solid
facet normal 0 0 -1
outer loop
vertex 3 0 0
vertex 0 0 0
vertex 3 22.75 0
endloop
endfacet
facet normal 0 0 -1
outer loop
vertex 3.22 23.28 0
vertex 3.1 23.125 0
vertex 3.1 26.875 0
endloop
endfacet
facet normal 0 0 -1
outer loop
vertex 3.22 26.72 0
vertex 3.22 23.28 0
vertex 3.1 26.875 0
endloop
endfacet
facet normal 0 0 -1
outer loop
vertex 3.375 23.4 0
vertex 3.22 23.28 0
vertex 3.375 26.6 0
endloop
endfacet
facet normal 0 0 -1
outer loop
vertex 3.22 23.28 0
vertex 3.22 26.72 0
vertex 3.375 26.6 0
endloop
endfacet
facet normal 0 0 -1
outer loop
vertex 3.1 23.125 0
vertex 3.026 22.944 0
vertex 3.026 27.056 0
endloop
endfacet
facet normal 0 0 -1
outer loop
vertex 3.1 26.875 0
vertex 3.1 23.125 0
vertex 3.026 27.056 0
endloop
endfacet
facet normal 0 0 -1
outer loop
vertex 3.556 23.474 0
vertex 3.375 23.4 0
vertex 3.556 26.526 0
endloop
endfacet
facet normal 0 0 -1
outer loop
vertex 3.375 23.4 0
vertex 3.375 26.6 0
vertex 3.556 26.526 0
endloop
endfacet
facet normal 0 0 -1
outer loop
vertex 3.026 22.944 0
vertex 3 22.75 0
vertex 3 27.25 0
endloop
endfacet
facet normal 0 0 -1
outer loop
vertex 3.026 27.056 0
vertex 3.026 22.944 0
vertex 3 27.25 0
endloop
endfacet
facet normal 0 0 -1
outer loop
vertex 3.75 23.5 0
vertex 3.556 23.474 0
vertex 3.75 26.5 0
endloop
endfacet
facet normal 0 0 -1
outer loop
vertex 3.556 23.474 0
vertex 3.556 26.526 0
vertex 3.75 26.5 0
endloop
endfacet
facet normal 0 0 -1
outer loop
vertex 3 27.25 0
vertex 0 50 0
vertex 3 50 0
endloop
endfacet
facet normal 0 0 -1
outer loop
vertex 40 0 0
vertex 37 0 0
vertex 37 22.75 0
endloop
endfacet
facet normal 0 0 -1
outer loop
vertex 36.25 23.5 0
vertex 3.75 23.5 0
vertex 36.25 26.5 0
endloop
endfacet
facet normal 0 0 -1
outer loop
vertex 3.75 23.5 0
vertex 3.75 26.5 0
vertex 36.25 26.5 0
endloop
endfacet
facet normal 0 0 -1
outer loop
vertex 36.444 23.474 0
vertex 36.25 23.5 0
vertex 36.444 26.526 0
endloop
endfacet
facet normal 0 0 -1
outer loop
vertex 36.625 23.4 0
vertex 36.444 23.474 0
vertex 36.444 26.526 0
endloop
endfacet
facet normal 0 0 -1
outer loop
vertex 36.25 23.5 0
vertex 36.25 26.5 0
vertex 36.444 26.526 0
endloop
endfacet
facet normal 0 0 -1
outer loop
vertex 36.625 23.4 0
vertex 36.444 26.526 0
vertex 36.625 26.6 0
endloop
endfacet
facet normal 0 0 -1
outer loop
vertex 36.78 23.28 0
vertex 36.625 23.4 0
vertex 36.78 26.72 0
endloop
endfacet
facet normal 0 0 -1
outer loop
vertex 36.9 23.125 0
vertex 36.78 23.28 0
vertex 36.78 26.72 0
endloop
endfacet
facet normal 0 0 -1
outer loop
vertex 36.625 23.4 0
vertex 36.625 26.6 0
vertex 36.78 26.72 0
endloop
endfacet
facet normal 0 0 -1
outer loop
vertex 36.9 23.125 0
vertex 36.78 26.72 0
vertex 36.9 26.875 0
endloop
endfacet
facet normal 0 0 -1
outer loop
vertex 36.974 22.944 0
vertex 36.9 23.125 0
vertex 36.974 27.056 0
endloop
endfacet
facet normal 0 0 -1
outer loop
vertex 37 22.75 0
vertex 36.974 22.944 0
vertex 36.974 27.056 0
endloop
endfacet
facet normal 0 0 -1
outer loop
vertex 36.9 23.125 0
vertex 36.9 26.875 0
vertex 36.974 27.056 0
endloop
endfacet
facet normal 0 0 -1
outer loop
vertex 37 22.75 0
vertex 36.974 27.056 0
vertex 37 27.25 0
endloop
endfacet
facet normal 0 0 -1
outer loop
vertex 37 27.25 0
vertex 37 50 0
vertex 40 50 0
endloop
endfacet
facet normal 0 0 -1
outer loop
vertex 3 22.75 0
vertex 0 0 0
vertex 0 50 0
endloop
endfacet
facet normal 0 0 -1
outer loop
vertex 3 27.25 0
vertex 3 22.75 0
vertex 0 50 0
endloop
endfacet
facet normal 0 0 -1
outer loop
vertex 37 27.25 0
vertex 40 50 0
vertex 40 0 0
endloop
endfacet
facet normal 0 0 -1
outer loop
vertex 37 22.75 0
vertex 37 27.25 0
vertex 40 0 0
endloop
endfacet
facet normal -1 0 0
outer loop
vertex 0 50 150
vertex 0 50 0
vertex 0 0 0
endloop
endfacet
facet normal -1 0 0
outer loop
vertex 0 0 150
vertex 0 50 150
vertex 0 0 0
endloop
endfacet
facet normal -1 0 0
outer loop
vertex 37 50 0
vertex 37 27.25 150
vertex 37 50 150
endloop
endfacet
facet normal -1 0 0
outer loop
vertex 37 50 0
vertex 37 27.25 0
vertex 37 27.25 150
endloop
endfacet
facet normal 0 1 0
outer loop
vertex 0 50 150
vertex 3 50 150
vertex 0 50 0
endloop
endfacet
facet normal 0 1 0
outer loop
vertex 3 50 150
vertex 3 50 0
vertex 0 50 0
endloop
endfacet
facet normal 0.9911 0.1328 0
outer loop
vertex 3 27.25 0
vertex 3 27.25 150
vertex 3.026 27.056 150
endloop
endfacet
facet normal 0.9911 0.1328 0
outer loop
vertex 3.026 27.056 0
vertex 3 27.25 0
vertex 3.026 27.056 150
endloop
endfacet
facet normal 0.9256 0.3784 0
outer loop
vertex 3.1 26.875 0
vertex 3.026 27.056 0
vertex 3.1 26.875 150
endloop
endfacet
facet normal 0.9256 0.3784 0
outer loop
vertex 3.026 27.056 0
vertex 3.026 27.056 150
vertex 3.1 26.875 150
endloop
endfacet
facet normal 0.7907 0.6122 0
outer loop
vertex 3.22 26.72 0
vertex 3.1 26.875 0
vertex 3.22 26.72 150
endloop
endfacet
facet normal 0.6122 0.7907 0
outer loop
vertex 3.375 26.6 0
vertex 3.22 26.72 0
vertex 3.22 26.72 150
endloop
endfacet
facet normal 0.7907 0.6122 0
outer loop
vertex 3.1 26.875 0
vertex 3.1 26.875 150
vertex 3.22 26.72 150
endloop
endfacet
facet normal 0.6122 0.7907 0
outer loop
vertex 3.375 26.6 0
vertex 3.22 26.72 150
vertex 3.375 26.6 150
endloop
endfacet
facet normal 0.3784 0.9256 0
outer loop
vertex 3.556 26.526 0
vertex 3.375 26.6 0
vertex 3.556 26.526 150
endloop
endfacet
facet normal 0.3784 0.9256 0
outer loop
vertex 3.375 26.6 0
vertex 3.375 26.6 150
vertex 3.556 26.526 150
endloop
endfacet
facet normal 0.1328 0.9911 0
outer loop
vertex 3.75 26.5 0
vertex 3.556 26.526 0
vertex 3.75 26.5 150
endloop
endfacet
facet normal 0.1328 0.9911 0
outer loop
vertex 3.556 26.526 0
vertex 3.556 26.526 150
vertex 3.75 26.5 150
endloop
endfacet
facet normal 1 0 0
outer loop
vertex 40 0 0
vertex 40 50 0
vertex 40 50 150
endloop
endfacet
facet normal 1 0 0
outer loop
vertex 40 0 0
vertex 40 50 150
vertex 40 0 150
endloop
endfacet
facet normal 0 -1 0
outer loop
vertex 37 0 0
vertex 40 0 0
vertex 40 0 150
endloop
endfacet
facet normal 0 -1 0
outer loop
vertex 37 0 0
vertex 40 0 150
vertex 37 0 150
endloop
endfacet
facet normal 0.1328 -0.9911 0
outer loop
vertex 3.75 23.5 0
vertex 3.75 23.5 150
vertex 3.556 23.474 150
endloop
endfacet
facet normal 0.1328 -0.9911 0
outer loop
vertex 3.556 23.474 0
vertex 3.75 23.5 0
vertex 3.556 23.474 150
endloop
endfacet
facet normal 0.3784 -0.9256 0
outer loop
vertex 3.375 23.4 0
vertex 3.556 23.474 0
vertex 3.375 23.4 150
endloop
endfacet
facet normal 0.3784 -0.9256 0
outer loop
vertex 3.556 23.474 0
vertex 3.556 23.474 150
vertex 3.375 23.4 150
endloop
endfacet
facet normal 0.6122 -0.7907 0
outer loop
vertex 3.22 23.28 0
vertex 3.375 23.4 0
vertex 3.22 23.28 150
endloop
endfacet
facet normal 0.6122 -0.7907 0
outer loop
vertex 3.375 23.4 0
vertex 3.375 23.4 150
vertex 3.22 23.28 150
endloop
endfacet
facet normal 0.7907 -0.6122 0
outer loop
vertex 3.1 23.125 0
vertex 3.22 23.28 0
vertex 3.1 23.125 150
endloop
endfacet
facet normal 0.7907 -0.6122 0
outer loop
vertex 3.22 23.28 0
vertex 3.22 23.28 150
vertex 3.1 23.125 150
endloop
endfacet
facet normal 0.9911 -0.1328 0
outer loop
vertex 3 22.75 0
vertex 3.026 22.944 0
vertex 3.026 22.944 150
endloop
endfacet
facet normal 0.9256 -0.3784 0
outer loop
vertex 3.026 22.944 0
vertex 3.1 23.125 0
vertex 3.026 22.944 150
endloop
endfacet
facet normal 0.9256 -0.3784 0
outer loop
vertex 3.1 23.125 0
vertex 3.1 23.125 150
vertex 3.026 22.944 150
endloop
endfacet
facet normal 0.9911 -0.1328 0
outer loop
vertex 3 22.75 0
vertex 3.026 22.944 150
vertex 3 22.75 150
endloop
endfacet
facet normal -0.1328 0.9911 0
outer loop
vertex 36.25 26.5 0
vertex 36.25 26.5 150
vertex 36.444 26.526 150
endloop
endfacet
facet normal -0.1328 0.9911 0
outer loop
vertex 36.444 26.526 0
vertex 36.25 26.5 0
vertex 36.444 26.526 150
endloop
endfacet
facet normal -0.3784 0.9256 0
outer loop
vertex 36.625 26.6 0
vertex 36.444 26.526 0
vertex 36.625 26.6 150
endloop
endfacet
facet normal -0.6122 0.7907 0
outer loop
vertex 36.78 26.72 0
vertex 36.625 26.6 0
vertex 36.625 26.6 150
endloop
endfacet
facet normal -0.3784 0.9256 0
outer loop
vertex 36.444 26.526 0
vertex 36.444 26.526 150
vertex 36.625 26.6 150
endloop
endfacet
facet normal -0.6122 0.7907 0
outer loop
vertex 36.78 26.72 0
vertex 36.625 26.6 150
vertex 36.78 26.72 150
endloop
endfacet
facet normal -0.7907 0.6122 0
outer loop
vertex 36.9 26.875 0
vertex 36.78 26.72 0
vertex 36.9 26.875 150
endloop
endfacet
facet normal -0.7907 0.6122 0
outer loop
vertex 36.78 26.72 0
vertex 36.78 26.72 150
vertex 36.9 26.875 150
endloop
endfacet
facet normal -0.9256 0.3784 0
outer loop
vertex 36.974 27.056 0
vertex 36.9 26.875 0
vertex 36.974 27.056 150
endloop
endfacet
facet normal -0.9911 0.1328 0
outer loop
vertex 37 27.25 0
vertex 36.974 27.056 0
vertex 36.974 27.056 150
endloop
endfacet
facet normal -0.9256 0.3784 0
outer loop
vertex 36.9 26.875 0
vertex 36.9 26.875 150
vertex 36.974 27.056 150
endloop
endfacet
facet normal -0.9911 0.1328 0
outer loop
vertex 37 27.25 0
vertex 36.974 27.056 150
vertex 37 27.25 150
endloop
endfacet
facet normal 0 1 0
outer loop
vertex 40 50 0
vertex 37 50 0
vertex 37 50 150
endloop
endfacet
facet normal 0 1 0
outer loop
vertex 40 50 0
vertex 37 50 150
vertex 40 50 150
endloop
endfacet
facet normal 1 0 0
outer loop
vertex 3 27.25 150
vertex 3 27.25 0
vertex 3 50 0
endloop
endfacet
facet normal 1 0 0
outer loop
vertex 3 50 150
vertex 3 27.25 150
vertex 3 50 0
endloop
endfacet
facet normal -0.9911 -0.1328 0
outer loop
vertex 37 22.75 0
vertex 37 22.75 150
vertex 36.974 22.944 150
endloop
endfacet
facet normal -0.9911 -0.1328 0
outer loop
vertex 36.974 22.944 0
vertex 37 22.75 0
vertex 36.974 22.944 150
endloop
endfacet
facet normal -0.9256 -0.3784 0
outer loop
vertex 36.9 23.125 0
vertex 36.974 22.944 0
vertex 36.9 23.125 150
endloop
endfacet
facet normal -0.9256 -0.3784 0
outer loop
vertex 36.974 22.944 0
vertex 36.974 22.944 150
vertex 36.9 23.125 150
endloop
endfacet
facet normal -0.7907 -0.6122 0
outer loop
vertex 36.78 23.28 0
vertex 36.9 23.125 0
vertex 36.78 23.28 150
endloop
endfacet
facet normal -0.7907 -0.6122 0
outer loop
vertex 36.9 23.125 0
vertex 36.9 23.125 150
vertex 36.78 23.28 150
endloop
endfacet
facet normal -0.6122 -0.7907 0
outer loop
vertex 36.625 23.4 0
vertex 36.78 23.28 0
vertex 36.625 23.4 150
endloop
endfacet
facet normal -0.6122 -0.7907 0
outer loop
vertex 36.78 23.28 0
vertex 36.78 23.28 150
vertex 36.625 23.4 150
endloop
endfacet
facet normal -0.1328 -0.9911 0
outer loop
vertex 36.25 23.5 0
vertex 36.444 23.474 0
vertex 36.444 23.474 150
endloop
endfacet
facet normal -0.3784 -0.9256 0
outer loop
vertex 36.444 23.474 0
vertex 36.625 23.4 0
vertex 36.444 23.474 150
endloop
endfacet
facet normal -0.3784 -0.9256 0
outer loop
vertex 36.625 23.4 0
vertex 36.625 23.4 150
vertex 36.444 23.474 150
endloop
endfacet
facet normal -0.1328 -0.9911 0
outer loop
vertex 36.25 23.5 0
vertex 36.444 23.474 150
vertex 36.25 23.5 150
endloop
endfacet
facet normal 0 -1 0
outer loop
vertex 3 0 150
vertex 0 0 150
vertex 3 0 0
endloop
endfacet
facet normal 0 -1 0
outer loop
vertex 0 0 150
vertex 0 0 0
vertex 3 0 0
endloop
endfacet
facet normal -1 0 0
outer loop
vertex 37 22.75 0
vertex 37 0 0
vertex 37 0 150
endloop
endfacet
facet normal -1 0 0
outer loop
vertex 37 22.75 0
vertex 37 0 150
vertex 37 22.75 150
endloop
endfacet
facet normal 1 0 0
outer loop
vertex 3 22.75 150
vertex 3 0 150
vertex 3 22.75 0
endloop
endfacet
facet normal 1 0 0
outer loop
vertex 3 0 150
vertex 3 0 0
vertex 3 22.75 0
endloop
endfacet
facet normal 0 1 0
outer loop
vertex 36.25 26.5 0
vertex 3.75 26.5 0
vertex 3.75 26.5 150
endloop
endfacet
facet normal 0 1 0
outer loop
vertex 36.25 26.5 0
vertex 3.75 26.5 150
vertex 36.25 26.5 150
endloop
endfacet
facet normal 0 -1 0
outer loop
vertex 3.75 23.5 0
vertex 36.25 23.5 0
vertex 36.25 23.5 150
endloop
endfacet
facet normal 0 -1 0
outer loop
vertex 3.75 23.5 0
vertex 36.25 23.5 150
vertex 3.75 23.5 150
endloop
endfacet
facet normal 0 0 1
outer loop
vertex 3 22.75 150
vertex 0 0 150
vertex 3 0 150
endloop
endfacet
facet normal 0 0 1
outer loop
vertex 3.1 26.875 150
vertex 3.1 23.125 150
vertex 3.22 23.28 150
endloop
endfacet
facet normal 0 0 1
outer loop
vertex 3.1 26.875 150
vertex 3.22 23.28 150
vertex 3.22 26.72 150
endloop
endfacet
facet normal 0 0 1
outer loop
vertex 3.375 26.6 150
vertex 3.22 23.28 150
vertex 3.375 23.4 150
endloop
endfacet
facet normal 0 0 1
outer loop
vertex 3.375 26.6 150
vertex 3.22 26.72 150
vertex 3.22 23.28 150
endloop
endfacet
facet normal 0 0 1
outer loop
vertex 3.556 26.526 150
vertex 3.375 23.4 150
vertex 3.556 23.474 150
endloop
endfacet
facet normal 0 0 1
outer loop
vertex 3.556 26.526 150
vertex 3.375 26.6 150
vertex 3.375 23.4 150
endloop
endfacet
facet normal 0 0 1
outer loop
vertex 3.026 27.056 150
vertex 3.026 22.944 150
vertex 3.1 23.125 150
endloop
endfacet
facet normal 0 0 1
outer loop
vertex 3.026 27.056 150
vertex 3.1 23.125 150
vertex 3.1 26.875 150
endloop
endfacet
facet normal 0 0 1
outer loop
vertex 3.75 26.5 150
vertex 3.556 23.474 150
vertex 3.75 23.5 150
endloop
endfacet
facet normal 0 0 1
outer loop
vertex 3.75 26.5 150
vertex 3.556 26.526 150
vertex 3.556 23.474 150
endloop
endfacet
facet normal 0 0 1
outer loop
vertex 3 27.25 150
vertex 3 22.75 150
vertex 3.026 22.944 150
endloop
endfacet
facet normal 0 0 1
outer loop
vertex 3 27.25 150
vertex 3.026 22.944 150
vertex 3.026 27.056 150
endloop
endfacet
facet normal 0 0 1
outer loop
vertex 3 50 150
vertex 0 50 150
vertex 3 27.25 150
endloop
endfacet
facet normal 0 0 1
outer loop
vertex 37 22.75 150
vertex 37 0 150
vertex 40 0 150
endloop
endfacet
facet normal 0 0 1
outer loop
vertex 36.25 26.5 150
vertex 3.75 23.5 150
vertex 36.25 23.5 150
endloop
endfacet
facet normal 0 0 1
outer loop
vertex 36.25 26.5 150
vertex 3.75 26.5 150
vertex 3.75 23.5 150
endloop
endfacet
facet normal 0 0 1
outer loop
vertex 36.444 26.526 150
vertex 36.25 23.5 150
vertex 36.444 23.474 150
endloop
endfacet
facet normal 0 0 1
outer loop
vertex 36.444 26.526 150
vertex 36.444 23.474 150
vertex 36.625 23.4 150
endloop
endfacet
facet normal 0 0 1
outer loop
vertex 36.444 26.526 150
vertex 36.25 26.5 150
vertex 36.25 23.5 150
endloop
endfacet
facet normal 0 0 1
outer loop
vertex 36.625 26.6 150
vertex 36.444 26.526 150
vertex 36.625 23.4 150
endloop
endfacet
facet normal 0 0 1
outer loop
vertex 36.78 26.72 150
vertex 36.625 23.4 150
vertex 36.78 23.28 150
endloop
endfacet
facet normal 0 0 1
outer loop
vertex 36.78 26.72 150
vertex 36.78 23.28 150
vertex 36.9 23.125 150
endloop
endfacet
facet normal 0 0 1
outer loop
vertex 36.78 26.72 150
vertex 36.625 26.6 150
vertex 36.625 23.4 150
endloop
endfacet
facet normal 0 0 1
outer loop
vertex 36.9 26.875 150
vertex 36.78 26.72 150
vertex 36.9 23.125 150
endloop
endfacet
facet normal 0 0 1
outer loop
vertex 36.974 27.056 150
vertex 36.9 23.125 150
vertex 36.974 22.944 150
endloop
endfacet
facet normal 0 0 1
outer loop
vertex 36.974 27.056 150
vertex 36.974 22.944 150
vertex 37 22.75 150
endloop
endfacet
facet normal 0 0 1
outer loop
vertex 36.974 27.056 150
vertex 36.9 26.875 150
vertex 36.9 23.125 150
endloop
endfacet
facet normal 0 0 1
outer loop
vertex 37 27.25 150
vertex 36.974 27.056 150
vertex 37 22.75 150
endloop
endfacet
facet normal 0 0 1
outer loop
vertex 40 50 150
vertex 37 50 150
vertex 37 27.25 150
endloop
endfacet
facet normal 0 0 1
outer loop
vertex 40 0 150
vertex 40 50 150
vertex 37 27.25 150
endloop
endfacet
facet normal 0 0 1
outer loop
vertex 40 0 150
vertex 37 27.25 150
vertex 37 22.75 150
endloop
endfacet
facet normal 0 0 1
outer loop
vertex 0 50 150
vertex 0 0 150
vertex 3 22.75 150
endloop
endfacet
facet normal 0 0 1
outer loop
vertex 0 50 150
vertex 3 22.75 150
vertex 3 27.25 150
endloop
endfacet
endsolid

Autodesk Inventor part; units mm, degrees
ref_plane "YZ Plane" through (0, 0, 0) normal (1, 0, 0) x (0, 1, 0)
ref_plane "XZ Plane" through (0, 0, 0) normal (0, 1, 0) x (-1, 0, 0)
ref_plane "XY Plane" through (0, 0, 0) normal (0, 0, 1) x (1, 0, 0)
sketch "Sketch1" plane through (0, 0, 0) normal (0, 0, 1) x (1, 0, 0)
  line L0 (0, 0) -> (3, 0)
  line L1 (3, 0) -> (3, 50)
  line L2 (3, 50) -> (0, 50)
  line L3 (0, 50) -> (0, 0)
  line L4 (3, 26.5) -> (37, 26.5)
  line L5 (37, 26.5) -> (37, 23.5)
  line L6 (37, 23.5) -> (3, 23.5)
  line L7 (3, 23.5) -> (3, 26.5)
  line L8 (37, 50) -> (40, 50)
  line L9 (40, 50) -> (40, 0)
  line L10 (40, 0) -> (37, 0)
  line L11 (37, 0) -> (37, 50)
  line L12 (0, 25) -> (40, 25) construction
  dimension "d3" = 3
  dimension "d4" = 40
  dimension "d9" = 1.5
  dimension "d10" = 50
  dimension "d11" = 25
extrude "Extrusion1" add sketch "Sketch1" along normal blind 150
fillet "Fillet1" radius 0.75 4 edges at (3, 23.5, 75) (37, 23.5, 75) (37, 26.5, 75) (3, 26.5, 75)
properties part number "Arm"
